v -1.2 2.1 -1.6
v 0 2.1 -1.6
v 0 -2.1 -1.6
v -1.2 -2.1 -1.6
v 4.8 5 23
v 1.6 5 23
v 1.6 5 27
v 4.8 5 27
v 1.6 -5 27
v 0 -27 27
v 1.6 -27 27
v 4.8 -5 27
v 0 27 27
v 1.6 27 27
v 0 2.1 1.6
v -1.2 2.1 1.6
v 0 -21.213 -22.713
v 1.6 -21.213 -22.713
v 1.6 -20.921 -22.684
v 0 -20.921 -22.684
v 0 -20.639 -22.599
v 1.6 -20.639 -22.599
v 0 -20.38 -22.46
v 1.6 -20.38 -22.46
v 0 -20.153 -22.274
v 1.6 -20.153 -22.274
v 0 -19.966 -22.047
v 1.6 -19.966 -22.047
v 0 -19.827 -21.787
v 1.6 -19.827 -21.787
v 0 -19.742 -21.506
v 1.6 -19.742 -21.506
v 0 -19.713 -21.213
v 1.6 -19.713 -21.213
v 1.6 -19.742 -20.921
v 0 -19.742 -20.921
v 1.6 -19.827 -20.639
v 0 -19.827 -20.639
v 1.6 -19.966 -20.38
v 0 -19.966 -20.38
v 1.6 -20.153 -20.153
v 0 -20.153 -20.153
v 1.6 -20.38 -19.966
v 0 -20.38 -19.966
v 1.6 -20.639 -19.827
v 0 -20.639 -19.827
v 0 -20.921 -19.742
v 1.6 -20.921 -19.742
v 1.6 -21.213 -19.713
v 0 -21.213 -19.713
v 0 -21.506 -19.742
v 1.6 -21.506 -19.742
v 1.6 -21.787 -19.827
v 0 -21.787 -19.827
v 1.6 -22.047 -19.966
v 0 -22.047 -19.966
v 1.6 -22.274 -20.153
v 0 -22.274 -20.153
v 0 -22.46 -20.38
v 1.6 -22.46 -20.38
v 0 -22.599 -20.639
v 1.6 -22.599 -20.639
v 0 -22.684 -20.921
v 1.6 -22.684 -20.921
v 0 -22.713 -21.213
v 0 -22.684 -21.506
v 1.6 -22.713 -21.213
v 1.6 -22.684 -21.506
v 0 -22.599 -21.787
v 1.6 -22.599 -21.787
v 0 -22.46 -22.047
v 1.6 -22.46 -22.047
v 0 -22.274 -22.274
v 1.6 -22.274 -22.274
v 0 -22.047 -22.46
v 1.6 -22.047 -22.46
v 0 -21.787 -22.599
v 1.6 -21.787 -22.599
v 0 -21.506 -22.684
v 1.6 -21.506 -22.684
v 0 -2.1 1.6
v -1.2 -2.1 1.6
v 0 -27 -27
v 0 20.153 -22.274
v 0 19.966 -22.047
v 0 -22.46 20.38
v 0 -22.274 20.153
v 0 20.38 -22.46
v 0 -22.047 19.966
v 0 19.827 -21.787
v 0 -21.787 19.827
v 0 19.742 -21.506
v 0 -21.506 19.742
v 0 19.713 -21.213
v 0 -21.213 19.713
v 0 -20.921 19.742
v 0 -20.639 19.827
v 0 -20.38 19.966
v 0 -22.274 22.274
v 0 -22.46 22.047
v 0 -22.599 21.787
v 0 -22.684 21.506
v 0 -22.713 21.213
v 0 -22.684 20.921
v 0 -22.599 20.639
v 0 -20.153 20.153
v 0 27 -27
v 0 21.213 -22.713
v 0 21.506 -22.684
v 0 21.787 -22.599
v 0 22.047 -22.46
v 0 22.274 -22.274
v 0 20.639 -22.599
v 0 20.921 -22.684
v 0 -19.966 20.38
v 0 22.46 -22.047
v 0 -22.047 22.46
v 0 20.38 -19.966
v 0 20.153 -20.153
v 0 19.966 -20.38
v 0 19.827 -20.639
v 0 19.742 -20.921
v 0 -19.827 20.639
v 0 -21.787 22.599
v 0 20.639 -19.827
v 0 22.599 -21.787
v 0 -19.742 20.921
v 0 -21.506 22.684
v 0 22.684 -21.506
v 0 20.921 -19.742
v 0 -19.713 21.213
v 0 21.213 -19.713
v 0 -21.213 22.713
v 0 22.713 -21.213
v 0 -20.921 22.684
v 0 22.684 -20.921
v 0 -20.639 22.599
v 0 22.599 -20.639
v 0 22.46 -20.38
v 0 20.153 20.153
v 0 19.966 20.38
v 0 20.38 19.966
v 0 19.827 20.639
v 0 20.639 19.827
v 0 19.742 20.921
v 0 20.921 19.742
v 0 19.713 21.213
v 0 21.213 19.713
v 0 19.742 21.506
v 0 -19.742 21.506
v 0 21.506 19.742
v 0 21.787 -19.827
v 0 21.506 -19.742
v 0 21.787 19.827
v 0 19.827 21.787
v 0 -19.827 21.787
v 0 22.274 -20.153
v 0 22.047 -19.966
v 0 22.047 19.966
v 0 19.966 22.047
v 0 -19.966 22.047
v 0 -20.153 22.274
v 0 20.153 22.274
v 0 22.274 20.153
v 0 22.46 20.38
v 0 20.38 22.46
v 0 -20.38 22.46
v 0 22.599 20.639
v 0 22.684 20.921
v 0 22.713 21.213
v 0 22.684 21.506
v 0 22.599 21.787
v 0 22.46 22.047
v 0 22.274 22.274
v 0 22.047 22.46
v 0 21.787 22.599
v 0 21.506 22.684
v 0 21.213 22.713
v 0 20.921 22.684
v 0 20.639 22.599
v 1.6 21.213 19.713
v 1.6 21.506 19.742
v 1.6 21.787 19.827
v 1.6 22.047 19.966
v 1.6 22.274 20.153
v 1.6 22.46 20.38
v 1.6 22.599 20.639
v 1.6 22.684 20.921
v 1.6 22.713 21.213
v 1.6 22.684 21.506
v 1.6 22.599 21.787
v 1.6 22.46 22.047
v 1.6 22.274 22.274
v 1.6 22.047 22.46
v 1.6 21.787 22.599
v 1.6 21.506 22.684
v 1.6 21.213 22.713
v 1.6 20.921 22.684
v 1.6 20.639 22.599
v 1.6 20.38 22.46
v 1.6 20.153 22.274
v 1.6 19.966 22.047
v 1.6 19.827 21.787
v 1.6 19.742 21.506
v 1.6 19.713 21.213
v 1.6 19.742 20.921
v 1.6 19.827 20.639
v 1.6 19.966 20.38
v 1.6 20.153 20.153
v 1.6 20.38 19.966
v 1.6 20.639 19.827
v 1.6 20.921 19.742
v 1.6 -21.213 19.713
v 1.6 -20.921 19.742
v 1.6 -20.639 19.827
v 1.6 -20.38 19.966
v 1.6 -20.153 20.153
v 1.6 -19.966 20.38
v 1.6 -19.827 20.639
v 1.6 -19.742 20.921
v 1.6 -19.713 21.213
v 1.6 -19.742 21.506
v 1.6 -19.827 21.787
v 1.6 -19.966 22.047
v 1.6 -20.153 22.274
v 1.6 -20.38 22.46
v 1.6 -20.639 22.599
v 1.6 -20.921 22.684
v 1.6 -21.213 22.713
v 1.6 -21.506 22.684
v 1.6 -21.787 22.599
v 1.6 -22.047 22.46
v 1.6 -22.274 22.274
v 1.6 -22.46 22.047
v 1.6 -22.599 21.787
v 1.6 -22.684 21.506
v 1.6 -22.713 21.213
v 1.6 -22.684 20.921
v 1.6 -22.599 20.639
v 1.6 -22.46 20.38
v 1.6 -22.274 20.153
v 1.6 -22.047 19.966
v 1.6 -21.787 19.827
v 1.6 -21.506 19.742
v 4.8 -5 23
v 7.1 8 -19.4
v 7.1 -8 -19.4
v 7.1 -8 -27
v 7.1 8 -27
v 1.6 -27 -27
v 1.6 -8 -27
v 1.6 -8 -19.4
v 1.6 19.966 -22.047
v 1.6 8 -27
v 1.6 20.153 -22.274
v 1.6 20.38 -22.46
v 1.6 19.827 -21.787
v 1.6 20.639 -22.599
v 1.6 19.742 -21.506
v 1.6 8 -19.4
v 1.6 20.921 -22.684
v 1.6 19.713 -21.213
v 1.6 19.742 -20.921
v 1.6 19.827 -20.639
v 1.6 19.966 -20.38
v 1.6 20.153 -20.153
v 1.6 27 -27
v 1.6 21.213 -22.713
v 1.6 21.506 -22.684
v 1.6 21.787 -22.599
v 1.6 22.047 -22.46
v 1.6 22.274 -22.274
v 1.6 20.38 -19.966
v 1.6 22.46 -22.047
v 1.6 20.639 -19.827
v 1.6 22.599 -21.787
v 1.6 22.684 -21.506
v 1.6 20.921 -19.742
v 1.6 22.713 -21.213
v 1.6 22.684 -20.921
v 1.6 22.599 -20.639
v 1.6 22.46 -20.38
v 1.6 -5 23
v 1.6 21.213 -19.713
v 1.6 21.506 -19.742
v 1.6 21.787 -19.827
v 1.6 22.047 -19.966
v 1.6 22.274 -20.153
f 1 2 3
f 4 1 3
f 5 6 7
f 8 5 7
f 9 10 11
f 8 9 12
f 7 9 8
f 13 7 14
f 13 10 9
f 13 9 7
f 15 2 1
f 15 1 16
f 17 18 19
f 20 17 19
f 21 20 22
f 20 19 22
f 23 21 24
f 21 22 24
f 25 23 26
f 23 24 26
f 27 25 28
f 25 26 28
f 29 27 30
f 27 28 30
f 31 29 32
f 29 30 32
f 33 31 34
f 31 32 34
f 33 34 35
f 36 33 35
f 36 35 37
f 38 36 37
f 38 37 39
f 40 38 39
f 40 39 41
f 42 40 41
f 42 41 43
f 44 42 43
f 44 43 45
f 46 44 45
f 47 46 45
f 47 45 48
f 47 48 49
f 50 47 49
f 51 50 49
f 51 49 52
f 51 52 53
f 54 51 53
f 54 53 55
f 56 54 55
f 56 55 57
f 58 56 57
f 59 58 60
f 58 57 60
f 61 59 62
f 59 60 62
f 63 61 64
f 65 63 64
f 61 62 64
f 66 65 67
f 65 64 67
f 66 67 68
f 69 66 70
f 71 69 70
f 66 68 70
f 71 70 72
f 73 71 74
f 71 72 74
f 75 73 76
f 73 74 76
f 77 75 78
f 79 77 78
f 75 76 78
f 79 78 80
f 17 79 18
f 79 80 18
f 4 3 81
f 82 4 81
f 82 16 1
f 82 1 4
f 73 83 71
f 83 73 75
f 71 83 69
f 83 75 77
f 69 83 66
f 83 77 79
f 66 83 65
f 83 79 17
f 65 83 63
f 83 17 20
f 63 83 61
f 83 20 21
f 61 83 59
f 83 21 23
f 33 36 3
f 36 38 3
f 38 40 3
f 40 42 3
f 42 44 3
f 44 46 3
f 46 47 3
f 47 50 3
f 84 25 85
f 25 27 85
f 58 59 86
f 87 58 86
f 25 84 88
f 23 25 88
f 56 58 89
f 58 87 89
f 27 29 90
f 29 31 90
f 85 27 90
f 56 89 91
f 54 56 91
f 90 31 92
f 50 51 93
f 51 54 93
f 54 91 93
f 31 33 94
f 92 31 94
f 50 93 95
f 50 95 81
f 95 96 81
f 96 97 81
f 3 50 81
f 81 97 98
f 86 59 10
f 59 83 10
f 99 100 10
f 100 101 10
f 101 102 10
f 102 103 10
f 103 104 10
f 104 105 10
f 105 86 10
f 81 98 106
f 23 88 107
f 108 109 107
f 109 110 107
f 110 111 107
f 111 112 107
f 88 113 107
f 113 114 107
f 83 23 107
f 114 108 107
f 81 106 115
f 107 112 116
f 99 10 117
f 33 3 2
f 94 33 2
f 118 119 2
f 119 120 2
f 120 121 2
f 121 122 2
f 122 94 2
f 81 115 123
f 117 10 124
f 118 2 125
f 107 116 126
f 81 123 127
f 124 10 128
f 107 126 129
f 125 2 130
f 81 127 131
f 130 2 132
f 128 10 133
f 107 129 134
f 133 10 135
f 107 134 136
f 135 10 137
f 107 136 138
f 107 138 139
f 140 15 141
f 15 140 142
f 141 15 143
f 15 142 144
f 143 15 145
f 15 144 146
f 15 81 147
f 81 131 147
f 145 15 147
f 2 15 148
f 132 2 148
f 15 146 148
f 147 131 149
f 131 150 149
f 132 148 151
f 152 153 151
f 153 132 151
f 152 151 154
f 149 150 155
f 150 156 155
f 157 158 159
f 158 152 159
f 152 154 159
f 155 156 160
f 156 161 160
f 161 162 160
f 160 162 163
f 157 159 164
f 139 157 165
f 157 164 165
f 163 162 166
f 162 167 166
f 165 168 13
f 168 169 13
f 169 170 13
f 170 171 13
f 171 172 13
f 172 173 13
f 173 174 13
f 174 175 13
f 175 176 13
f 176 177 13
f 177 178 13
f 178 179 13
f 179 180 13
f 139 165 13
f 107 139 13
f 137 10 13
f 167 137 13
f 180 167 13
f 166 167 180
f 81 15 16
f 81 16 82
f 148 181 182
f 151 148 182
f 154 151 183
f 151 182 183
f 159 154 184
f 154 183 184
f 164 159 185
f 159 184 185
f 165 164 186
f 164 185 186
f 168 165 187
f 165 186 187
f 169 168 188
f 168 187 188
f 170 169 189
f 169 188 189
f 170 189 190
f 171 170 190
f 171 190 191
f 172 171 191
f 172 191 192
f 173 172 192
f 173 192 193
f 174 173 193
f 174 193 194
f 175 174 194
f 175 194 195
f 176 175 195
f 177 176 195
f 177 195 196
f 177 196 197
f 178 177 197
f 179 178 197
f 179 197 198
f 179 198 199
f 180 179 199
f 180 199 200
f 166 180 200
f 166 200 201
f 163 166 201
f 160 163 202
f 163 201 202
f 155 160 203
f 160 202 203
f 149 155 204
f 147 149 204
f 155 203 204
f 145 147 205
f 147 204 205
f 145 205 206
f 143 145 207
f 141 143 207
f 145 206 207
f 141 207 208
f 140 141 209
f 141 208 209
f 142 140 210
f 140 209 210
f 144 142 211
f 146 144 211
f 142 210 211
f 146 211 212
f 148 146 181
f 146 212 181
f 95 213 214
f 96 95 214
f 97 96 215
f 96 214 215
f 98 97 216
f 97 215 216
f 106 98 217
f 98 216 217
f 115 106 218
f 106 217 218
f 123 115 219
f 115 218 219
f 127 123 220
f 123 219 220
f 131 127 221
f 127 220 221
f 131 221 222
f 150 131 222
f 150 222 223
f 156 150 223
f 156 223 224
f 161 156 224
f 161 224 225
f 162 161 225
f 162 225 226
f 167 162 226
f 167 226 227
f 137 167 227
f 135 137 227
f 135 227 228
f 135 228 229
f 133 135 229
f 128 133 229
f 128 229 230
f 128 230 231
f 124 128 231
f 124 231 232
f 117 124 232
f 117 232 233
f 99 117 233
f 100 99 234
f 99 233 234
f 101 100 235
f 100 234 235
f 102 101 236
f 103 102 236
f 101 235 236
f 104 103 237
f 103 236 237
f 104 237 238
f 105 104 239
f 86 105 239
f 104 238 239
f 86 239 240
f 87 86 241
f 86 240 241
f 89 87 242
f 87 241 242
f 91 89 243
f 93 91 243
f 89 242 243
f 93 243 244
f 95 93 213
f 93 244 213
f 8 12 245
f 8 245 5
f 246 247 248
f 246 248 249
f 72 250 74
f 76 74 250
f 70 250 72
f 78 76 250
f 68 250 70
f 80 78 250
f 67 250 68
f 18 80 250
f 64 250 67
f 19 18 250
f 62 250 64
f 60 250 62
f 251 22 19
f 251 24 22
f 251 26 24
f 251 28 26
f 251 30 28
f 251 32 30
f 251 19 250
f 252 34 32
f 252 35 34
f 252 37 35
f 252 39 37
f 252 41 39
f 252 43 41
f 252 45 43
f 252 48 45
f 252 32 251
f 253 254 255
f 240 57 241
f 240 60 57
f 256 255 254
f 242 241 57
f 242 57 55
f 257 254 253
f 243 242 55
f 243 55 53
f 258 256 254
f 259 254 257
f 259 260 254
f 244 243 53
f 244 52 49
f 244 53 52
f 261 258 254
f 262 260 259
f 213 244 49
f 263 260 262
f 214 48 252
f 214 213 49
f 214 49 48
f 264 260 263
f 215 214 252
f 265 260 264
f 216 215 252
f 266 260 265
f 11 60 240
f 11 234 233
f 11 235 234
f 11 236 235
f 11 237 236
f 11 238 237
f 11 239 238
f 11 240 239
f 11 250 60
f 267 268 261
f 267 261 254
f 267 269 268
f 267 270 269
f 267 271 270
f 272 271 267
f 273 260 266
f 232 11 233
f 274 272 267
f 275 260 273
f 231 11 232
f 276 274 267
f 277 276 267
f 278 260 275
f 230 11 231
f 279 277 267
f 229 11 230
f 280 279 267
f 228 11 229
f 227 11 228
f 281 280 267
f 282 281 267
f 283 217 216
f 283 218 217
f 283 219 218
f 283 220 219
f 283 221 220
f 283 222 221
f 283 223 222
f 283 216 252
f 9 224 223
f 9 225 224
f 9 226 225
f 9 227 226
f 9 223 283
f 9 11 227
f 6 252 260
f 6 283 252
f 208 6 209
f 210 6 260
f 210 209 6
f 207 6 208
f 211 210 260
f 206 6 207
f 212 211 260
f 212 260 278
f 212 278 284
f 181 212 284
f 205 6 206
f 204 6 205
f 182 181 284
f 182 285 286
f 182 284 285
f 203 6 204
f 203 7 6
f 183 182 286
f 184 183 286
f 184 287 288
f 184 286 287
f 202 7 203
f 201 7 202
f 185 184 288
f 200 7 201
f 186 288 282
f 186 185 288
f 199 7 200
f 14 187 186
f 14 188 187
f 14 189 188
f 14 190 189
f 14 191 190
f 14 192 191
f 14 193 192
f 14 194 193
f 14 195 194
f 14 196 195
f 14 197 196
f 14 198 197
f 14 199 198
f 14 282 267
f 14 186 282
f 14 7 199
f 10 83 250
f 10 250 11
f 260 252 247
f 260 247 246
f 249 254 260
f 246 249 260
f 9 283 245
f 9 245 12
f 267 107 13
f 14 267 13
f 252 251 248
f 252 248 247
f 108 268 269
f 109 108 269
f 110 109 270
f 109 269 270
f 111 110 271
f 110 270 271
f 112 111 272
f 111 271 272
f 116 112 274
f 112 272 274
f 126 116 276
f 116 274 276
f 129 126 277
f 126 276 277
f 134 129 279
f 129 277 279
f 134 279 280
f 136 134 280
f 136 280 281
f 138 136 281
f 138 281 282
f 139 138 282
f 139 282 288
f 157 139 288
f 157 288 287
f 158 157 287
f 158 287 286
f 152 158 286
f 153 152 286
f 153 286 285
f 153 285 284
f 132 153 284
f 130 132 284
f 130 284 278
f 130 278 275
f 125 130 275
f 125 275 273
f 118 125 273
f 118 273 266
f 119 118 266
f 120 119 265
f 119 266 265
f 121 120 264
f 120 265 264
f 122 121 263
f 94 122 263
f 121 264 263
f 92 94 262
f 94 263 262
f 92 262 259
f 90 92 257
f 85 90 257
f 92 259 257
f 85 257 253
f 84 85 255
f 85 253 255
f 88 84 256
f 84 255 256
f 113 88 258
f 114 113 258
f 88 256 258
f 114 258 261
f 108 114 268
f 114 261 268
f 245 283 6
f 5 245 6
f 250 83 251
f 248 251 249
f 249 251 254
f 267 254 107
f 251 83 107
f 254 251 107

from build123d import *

# Parameters (mm, degrees)
SKETCH1_W           = 54
SKETCH1_H           = 54
BOSS_EXTRUDE1_DEPTH = 1.6
SKETCH2_R           = 1.5
CUT_EXTRUDE1_DEPTH  = 39.217273581
SKETCH3_W           = 4.2
SKETCH3_H           = 3.2
BOSS_EXTRUDE2_DEPTH = 1.2
SKETCH4_W           = 16
SKETCH4_H           = 7.6
BOSS_EXTRUDE3_DEPTH = 5.5
SKETCH5_W           = 10
SKETCH5_H           = 4
BOSS_EXTRUDE4_DEPTH = 3.2


with BuildPart() as part:
    # Sketch1 → Boss-Extrude1 (new body)
    with BuildSketch(Plane.YZ):
        Rectangle(SKETCH1_W, SKETCH1_H)
    extrude(amount=BOSS_EXTRUDE1_DEPTH)

    # Sketch2 → Cut-Extrude1 (cut, through all)
    with BuildSketch(Plane.YZ.offset(1.6)):
        with Locations(Location((-21.213203436, 21.213203436, 0), (0, 0, 270))):
            Circle(SKETCH2_R)
        with Locations(Location((21.213203436, 21.213203436, 0), (0, 0, 270))):
            Circle(SKETCH2_R)
        with Locations(Location((-21.213203436, -21.213203436, 0), (0, 0, 270))):
            Circle(SKETCH2_R)
        with Locations(Location((21.213203436, -21.213203436, 0), (0, 0, 270))):
            Circle(SKETCH2_R)
    extrude(amount=-CUT_EXTRUDE1_DEPTH, mode=Mode.SUBTRACT)

    # Sketch3 → Boss-Extrude2 (add)
    with BuildSketch(Plane(origin=(0, 0, 0), x_dir=(0, -1, 0), z_dir=(-1, 0, 0))):
        Rectangle(SKETCH3_W, SKETCH3_H)
    extrude(amount=BOSS_EXTRUDE2_DEPTH)

    # Sketch4 → Boss-Extrude3 (add)
    with BuildSketch(Plane.YZ.offset(1.6)):
        with Locations((0, -23.2)):
            Rectangle(SKETCH4_W, SKETCH4_H)
    extrude(amount=BOSS_EXTRUDE3_DEPTH)

    # Sketch5 → Boss-Extrude4 (add)
    with BuildSketch(Plane.YZ.offset(1.6)):
        with Locations((0, 25)):
            Rectangle(SKETCH5_W, SKETCH5_H)
    extrude(amount=BOSS_EXTRUDE4_DEPTH)


solid = part.part
